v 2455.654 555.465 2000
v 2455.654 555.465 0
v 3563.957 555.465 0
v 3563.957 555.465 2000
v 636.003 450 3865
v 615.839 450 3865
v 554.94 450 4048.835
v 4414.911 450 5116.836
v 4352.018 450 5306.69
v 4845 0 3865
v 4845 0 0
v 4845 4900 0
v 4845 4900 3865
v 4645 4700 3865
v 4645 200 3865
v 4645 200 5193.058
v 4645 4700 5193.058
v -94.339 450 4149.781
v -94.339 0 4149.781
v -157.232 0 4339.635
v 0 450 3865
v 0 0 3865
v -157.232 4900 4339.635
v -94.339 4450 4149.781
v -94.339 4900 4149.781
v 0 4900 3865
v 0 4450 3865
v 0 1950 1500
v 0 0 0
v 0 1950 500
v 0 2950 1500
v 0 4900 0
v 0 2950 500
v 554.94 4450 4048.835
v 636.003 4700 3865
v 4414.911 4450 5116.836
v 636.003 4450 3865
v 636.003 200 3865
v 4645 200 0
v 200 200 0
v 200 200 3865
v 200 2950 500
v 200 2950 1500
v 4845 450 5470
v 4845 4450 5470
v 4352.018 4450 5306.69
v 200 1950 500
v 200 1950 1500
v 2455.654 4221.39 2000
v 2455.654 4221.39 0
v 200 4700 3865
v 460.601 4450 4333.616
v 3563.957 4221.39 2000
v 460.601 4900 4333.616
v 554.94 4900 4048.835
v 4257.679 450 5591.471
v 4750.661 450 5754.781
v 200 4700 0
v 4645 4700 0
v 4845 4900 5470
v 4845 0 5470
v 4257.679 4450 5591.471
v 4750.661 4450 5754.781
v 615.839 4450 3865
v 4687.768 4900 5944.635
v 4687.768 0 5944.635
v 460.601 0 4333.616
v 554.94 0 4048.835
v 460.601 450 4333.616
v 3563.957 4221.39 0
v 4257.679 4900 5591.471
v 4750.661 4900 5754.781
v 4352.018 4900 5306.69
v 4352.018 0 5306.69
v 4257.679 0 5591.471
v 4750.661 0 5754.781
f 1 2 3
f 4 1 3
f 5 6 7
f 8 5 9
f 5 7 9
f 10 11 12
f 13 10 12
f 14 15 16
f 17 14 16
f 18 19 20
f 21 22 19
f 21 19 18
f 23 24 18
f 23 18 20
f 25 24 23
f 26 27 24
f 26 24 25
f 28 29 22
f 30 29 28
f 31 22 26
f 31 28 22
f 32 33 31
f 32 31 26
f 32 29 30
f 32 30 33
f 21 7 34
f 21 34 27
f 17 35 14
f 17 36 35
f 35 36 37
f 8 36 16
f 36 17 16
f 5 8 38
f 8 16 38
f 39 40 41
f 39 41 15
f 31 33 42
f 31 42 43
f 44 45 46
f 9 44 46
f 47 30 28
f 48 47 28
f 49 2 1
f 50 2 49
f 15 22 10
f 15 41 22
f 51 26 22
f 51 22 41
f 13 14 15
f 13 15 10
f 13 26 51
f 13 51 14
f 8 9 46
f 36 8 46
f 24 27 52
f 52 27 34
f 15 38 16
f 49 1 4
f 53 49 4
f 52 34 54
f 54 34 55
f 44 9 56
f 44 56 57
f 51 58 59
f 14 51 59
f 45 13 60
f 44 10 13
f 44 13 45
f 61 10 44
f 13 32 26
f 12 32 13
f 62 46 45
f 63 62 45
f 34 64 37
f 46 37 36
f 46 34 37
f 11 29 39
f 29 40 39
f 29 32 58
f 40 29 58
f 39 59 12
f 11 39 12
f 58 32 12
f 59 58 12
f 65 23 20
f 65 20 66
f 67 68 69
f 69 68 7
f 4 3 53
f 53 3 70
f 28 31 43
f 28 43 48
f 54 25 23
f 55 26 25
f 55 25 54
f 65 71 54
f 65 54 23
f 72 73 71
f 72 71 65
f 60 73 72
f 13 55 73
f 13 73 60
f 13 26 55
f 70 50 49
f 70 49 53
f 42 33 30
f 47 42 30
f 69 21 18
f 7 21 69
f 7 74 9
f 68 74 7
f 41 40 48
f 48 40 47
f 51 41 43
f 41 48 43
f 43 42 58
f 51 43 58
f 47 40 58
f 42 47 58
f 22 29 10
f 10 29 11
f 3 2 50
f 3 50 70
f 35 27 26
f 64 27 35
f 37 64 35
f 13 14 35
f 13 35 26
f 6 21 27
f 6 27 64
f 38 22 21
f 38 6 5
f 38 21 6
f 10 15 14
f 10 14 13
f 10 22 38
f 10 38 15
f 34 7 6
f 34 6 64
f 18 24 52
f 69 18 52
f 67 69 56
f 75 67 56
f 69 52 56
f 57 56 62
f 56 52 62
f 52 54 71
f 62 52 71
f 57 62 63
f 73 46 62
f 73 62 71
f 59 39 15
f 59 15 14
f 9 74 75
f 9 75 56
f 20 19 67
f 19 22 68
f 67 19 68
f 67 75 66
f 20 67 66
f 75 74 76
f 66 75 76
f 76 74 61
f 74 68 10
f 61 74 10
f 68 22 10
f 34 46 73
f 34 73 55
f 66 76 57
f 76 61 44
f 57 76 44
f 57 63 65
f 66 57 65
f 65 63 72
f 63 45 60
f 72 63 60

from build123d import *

# Parameters (mm, degrees)
F0_W      = 4845
F0_H      = 4900
F0_W_2    = 4445
F0_H_2    = 4500
F1_DEPTH  = 3865
F2_W      = 1000
F2_H      = 1000
F3_DEPTH  = 250
F5_DEPTH  = 4900
F6_T      = -200
F7_W      = 4000
F7_H      = 4000
F8_DEPTH  = 800
F9_W      = 584.5971388106
F9_H      = 450
F9_W_2    = 519.3278214528
F10_DEPTH = 300
F11_W     = 5103.9249602634
F11_H     = 4900
F12_DEPTH = 200
F0_W_3    = 1108.3028316498
F0_H_3    = 3665.9249663353
F13_DEPTH = 2000


with BuildPart() as f1:
    # F0 (on Top) → F1 (new body)
    with BuildSketch(Plane.XY):
        with Locations((2422.5, 2450)):
            Rectangle(F0_W, F0_H)
        with Locations((2422.5, 2450)):
            Rectangle(F0_W_2, F0_H_2, mode=Mode.SUBTRACT)
    extrude(amount=F1_DEPTH)

    # F2 (on face) → F3 (cut)
    with BuildSketch(Plane(origin=(0, 0, 0), x_dir=(0, -1, 0), z_dir=(-1, 0, 0))):
        with Locations((-2450, 1000)):
            Rectangle(F2_W, F2_H)
    extrude(amount=-F3_DEPTH, mode=Mode.SUBTRACT)


with BuildPart() as f5:
    # F4 (on face) → F5 (new body)
    with BuildSketch(Plane.XZ):
        Polygon((4845, 5470), (0, 3865), (4845, 3865), align=None)
    extrude(amount=-F5_DEPTH)

    # F6
    f6_openings = [f5.faces().sort_by_distance(p)[0] for p in [
        (2422.5, 2450, 3865),
    ]]
    offset(amount=F6_T, openings=f6_openings)

    # F7 (on face) → F8 (cut)
    with BuildSketch(Plane(origin=(-1153.7447960752, 0, 3482.7997115169), x_dir=(0.9492694422, 0, 0.3144638709), z_dir=(-0.3144638709, 0, 0.9492694422))):
        with Locations((3800, 2450)):
            Rectangle(F7_W, F7_H)
    extrude(amount=-F8_DEPTH, mode=Mode.SUBTRACT)

    # F9 (on face) → F10 (join)
    with BuildSketch(Plane(origin=(-1153.7447960752, 0, 3482.7997115169), x_dir=(0.9492694422, 0, 0.3144638709), z_dir=(-0.3144638709, 0, 0.9492694422))):
        with Locations((1507.7014305947, 4675)):
            Rectangle(F9_W, F9_H)
        with Locations((1507.7014305947, 225)):
            Rectangle(F9_W, F9_H)
        with Locations((6059.6639107264, 225)):
            Rectangle(F9_W_2, F9_H)
        with Locations((6059.6639107264, 4675)):
            Rectangle(F9_W_2, F9_H)
    extrude(amount=F10_DEPTH)

    # F11 (on face) → F12 (join)
    with BuildSketch(Plane(origin=(-1248.0839573577, 0, 3767.5805441733), x_dir=(0.9492694422, 0, 0.3144638709), z_dir=(-0.3144638709, 0, 0.9492694422))):
        with Locations((3767.3653413211, 2450)):
            Rectangle(F11_W, F11_H)
    extrude(amount=F12_DEPTH)


with BuildPart() as f13:
    # F0 (on Top) → F13 (new body)
    with BuildSketch(Plane.XY):
        with Locations((3009.805560112, 2388.4277641773)):
            Rectangle(F0_W_3, F0_H_3)
    extrude(amount=F13_DEPTH)


solid = Compound([f1.part, f5.part, f13.part])
